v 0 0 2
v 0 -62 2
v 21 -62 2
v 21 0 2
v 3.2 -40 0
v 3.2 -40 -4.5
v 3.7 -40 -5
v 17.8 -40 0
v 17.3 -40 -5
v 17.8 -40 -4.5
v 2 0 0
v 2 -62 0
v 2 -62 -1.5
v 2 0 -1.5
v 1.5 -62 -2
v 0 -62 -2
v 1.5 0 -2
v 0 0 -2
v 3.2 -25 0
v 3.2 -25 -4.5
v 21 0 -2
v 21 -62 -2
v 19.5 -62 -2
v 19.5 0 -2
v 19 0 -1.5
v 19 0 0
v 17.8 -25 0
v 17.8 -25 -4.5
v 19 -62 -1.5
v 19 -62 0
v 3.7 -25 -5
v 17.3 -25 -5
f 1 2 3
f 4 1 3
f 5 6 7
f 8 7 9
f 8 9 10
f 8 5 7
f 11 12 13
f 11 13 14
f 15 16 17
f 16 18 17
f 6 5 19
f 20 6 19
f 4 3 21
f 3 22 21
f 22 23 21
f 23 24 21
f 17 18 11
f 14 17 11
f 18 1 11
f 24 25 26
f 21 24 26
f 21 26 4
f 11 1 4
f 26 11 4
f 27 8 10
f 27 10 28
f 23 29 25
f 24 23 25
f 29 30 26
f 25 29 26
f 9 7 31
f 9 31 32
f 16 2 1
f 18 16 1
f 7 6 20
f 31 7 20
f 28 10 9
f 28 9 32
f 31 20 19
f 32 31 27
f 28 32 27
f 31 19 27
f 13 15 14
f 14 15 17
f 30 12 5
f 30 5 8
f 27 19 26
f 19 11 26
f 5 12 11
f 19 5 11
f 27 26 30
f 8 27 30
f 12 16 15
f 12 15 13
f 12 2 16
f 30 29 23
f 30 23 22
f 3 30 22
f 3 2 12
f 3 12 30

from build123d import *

# Parameters (mm, degrees)
F0_W     = 2
F0_H     = 62
F0_W_2   = 17
F0_W_3   = 14.6
F0_H_2   = 15
F1_DEPTH = 2
F2_DEPTH = 5
F3_DEPTH = 2
F4_SIZE  = 0.5


with BuildPart() as f1:
    # F0 (on Top) → F1 (new body)
    with BuildSketch(Plane.XY):
        with Locations((1, -31)):
            Rectangle(F0_W, F0_H)
        with Locations((10.5, -31)):
            Rectangle(F0_W_2, F0_H)
        with Locations((10.5, -32.5)):
            Rectangle(F0_W_3, F0_H_2, mode=Mode.SUBTRACT)
        with Locations((20, -31)):
            Rectangle(F0_W, F0_H)
        with Locations((10.5, -32.5)):
            Rectangle(F0_W_3, F0_H_2)
    extrude(amount=F1_DEPTH)

    # F0 (on Top) → F2 (join)
    with BuildSketch(Plane.XY):
        with Locations((10.5, -32.5)):
            Rectangle(F0_W_3, F0_H_2)
    extrude(amount=-F2_DEPTH)

    # F0 (on Top) → F3 (join)
    with BuildSketch(Plane.XY):
        with Locations((1, -31)):
            Rectangle(F0_W, F0_H)
        with Locations((20, -31)):
            Rectangle(F0_W, F0_H)
    extrude(amount=-F3_DEPTH)

    # F4
    f4_edges = [f1.edges().sort_by_distance(p)[0] for p in [
        (2, -31, -2),
        (19, -31, -2),
        (3.2, -32.5, -5),
        (17.8, -32.5, -5),
    ]]
    chamfer(f4_edges, length=F4_SIZE)


solid = f1.part
